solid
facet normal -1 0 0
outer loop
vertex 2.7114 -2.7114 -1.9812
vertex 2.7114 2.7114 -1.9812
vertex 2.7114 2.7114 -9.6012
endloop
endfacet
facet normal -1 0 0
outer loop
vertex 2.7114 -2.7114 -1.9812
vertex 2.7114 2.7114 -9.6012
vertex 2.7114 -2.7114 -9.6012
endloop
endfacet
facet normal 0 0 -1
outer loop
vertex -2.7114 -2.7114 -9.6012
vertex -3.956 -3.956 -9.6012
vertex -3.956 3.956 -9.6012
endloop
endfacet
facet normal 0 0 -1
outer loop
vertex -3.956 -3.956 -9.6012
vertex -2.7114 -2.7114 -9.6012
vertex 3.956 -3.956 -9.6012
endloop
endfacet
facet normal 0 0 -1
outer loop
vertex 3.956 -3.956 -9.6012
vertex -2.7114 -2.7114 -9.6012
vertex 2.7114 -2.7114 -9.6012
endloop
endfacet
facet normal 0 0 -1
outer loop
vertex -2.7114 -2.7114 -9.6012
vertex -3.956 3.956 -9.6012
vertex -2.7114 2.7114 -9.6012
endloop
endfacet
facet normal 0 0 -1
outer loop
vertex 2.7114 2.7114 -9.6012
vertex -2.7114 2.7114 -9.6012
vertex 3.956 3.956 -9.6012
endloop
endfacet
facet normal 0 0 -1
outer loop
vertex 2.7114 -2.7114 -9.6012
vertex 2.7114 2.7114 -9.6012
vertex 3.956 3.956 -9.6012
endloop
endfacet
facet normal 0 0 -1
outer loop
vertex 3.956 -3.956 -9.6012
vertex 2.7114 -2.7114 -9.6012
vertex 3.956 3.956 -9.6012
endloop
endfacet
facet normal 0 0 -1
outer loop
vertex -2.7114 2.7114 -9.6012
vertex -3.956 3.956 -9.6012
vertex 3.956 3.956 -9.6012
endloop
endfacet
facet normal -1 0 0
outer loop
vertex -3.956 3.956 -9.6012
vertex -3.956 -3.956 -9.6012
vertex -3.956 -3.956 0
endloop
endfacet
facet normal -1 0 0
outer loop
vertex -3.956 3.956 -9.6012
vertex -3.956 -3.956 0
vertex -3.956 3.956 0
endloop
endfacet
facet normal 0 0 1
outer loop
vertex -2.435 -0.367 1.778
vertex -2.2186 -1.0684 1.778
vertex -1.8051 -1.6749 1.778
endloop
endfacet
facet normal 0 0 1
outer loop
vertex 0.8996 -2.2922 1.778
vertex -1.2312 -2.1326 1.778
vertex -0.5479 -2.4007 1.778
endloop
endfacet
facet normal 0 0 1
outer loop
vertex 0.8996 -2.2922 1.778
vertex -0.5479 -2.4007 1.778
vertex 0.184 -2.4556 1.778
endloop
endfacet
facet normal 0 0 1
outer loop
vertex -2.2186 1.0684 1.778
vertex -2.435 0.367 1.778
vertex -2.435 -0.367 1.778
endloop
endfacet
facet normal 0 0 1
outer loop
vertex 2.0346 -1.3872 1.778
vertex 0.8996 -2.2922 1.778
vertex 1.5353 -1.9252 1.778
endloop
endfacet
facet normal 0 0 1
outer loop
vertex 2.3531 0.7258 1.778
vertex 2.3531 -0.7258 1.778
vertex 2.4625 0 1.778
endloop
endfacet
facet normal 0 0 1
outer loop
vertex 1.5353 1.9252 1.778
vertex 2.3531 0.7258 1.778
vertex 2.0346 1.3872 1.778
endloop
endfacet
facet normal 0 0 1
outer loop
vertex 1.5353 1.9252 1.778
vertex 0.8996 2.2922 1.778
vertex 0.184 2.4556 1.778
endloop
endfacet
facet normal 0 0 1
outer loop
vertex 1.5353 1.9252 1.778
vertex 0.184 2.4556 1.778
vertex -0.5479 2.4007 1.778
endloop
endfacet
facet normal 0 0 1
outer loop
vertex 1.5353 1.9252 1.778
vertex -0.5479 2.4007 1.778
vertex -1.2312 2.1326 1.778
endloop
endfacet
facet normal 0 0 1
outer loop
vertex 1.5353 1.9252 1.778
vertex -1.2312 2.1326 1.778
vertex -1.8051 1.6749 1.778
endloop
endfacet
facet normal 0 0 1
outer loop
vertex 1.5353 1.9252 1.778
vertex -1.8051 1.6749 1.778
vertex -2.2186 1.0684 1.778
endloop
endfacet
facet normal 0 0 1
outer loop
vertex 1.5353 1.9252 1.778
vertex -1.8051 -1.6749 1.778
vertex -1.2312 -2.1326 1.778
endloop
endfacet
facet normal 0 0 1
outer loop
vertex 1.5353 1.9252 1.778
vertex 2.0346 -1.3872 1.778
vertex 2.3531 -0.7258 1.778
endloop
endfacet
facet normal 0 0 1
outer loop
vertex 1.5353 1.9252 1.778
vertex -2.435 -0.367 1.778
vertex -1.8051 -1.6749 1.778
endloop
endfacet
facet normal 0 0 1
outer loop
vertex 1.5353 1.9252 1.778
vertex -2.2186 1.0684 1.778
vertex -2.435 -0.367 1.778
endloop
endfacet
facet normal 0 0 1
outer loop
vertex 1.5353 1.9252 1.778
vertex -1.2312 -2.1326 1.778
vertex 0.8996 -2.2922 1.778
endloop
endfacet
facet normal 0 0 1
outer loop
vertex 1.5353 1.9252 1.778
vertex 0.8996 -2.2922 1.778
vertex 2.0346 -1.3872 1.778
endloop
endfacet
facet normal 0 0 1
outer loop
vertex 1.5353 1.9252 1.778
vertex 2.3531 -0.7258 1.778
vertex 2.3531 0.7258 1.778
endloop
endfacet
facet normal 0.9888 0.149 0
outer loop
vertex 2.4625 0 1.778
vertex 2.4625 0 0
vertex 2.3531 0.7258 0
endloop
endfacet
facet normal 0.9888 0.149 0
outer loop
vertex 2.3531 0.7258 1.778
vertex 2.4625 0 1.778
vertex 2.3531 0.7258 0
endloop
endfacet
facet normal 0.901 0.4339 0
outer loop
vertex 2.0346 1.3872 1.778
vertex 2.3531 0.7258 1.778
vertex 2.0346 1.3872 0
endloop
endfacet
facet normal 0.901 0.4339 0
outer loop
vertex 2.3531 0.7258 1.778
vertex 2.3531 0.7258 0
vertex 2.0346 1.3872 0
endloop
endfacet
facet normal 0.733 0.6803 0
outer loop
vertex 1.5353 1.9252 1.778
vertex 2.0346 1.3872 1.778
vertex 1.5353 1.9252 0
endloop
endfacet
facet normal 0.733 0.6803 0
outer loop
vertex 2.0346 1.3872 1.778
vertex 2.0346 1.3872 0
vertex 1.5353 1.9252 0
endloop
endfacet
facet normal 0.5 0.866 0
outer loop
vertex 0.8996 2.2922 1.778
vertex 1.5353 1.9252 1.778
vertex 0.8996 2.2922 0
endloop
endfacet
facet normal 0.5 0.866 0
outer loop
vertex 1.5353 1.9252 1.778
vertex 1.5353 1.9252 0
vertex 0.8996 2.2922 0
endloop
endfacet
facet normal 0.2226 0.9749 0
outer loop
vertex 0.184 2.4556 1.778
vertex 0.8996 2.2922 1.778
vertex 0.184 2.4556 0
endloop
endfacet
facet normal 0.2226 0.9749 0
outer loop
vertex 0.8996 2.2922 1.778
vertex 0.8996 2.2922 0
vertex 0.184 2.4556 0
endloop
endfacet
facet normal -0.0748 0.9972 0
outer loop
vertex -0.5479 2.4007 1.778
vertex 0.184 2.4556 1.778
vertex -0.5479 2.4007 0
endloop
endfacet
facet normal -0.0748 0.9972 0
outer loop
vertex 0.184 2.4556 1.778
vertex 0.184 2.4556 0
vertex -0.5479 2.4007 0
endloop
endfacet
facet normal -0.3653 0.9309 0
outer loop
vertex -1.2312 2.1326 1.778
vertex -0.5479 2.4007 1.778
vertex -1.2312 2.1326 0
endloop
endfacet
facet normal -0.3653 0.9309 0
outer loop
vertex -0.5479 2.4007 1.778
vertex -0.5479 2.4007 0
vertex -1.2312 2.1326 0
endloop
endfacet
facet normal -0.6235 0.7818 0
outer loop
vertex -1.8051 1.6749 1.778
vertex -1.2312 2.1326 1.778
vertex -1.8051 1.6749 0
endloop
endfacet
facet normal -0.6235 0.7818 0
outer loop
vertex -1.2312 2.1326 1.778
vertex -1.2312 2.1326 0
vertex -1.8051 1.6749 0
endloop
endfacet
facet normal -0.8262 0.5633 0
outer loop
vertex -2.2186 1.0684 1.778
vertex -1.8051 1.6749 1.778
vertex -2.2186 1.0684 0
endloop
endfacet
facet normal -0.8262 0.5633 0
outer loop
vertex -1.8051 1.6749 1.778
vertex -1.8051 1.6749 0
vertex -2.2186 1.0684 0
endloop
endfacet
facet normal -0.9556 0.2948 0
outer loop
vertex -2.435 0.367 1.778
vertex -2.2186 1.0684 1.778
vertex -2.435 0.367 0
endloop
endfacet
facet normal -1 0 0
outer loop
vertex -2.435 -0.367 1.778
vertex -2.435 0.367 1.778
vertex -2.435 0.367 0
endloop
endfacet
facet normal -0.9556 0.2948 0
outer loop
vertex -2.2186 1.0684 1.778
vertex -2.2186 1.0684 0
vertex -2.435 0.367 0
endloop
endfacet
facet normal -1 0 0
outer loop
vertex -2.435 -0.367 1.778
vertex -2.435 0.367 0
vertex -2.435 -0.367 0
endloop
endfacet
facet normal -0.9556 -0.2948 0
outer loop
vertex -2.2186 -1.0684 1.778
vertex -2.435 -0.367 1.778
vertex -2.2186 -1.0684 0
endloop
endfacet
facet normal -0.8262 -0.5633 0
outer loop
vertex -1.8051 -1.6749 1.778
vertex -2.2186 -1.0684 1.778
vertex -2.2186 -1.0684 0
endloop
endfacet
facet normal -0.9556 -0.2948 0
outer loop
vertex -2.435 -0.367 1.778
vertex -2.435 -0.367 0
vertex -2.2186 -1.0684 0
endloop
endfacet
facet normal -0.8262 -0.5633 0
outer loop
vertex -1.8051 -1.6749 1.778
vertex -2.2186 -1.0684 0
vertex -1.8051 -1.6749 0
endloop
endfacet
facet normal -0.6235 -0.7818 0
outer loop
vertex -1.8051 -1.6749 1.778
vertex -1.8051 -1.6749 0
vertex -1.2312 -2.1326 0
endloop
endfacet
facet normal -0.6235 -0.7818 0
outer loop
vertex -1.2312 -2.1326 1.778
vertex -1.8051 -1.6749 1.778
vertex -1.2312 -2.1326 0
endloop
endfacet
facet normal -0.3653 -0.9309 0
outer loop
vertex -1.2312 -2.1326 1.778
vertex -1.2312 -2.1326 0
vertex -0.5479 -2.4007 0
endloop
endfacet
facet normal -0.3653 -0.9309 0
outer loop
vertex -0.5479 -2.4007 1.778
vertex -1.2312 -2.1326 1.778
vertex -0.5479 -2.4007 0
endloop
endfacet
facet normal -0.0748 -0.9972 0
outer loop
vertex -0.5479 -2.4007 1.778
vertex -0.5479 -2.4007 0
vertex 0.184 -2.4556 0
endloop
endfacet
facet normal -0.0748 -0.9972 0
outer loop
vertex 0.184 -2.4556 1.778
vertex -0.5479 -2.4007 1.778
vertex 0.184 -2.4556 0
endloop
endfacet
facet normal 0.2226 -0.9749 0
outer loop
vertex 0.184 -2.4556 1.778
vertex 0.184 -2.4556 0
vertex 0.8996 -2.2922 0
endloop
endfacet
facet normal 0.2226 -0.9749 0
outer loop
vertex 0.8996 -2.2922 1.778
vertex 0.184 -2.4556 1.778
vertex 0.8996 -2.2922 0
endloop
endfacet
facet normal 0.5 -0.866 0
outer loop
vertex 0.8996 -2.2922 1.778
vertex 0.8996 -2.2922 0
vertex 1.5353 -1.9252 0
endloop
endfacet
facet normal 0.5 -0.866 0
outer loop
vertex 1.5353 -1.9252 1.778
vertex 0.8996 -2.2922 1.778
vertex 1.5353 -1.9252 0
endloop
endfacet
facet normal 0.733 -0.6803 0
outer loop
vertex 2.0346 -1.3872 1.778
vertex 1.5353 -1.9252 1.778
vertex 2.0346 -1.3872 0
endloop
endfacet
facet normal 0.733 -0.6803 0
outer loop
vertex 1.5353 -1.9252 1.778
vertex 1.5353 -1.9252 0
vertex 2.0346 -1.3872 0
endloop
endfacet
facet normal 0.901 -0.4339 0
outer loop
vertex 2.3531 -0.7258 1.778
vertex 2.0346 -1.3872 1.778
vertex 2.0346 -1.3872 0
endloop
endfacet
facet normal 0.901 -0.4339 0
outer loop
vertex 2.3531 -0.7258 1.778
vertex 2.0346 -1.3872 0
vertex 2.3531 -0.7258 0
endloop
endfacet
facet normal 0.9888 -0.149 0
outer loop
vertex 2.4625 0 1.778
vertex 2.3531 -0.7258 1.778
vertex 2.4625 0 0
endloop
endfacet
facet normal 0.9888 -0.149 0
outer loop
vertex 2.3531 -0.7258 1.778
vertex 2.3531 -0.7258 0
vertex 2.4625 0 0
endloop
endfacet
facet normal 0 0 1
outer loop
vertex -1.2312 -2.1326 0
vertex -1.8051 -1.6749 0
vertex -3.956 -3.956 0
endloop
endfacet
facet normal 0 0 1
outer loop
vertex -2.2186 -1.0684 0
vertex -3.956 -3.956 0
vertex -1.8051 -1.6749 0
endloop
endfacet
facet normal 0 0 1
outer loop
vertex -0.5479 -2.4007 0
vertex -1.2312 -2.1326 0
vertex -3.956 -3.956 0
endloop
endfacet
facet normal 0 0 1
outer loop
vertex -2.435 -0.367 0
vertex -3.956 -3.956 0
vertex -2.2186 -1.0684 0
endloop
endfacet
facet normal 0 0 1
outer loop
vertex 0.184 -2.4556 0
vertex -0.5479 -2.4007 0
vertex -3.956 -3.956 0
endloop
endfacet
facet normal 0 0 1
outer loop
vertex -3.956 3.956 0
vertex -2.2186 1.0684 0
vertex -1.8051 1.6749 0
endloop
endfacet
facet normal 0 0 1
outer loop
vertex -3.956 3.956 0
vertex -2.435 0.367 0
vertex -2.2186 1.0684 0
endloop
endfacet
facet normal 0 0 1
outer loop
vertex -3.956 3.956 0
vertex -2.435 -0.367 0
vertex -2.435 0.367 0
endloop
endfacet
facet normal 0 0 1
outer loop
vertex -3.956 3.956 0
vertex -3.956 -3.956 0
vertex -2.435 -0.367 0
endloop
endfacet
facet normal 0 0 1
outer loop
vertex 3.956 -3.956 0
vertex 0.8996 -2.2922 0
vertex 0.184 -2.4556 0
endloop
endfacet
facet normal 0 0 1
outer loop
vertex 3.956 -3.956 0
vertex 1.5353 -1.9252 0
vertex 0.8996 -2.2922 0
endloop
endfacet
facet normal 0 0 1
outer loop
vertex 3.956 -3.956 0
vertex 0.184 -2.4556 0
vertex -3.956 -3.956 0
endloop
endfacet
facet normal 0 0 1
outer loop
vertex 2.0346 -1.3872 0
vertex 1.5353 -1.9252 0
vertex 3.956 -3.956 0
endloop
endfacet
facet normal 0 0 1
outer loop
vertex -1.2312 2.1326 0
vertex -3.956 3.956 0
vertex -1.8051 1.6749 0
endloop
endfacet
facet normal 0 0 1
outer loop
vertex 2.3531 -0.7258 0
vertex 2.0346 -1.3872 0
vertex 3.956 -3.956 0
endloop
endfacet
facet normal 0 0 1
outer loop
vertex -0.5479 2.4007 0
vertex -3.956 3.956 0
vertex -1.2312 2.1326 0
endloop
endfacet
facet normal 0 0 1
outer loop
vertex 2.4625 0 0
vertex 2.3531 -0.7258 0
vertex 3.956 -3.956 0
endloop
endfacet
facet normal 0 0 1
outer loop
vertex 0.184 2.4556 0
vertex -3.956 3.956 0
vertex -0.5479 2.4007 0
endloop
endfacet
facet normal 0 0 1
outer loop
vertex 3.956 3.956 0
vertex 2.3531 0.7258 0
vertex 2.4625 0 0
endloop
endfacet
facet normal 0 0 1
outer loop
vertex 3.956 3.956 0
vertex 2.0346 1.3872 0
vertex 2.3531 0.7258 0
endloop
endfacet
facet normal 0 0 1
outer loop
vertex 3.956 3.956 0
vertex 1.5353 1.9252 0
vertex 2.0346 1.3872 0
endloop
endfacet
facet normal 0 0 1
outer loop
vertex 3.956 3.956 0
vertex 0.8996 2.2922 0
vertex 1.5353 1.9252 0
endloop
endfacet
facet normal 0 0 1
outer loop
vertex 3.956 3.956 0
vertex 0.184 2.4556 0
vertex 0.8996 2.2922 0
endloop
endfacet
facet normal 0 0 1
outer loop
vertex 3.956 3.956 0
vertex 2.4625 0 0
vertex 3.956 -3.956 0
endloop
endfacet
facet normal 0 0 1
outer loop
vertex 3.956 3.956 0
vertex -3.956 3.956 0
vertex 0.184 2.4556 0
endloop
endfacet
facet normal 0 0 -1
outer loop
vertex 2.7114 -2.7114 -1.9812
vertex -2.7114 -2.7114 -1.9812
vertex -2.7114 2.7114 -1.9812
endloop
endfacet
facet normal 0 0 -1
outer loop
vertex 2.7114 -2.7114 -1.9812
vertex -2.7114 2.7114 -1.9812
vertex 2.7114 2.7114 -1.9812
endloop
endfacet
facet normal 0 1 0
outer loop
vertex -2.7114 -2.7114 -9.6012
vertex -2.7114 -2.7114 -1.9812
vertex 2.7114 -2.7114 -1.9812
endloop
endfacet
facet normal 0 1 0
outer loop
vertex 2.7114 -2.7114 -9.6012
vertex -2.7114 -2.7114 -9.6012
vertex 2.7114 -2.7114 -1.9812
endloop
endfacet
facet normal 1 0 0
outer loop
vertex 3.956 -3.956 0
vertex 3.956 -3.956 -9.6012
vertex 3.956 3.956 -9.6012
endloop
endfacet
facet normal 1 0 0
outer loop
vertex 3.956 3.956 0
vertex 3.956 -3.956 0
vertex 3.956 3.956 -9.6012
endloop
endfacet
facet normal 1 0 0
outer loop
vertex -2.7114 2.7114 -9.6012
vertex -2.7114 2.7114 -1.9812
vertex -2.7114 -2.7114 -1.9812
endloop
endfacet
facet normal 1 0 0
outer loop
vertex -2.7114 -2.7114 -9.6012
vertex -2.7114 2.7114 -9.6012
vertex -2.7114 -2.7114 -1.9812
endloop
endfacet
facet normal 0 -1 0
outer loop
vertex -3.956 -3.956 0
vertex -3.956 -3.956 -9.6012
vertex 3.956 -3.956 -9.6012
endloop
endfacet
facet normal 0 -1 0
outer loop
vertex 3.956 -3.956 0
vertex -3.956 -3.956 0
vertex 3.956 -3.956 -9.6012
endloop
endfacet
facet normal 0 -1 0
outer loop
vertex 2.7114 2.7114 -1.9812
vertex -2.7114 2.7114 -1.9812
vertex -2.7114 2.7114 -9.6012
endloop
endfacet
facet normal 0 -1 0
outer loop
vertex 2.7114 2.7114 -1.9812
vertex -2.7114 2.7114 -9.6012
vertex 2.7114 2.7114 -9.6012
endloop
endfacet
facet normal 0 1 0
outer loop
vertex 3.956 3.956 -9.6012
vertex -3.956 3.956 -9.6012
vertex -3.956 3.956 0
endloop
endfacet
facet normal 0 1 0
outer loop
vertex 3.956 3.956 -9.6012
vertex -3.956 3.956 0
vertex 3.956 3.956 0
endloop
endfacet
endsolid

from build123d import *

# Parameters (mm, degrees)
F0_W     = 7.9121
F0_H     = 7.9121
F2_DEPTH = 9.6012
F1_R     = 2.462464
F3_DEPTH = 1.778
F4_W     = 5.4229
F4_H     = 5.4229
F5_DEPTH = 7.62


with BuildPart() as f2:
    # F0 (on Top) → F2 (new body)
    with BuildSketch(Plane.XY):
        Rectangle(F0_W, F0_H)
    extrude(amount=-F2_DEPTH)

    # F1 (on face) → F3 (join)
    with BuildSketch(Plane.XY):
        Circle(F1_R)
    extrude(amount=F3_DEPTH)

    # F4 (on face) → F5 (cut)
    with BuildSketch(Plane(origin=(0, 0, -9.6012), x_dir=(1, 0, 0), z_dir=(0, 0, -1))):
        Rectangle(F4_W, F4_H)
    extrude(amount=-F5_DEPTH, mode=Mode.SUBTRACT)


solid = f2.part
